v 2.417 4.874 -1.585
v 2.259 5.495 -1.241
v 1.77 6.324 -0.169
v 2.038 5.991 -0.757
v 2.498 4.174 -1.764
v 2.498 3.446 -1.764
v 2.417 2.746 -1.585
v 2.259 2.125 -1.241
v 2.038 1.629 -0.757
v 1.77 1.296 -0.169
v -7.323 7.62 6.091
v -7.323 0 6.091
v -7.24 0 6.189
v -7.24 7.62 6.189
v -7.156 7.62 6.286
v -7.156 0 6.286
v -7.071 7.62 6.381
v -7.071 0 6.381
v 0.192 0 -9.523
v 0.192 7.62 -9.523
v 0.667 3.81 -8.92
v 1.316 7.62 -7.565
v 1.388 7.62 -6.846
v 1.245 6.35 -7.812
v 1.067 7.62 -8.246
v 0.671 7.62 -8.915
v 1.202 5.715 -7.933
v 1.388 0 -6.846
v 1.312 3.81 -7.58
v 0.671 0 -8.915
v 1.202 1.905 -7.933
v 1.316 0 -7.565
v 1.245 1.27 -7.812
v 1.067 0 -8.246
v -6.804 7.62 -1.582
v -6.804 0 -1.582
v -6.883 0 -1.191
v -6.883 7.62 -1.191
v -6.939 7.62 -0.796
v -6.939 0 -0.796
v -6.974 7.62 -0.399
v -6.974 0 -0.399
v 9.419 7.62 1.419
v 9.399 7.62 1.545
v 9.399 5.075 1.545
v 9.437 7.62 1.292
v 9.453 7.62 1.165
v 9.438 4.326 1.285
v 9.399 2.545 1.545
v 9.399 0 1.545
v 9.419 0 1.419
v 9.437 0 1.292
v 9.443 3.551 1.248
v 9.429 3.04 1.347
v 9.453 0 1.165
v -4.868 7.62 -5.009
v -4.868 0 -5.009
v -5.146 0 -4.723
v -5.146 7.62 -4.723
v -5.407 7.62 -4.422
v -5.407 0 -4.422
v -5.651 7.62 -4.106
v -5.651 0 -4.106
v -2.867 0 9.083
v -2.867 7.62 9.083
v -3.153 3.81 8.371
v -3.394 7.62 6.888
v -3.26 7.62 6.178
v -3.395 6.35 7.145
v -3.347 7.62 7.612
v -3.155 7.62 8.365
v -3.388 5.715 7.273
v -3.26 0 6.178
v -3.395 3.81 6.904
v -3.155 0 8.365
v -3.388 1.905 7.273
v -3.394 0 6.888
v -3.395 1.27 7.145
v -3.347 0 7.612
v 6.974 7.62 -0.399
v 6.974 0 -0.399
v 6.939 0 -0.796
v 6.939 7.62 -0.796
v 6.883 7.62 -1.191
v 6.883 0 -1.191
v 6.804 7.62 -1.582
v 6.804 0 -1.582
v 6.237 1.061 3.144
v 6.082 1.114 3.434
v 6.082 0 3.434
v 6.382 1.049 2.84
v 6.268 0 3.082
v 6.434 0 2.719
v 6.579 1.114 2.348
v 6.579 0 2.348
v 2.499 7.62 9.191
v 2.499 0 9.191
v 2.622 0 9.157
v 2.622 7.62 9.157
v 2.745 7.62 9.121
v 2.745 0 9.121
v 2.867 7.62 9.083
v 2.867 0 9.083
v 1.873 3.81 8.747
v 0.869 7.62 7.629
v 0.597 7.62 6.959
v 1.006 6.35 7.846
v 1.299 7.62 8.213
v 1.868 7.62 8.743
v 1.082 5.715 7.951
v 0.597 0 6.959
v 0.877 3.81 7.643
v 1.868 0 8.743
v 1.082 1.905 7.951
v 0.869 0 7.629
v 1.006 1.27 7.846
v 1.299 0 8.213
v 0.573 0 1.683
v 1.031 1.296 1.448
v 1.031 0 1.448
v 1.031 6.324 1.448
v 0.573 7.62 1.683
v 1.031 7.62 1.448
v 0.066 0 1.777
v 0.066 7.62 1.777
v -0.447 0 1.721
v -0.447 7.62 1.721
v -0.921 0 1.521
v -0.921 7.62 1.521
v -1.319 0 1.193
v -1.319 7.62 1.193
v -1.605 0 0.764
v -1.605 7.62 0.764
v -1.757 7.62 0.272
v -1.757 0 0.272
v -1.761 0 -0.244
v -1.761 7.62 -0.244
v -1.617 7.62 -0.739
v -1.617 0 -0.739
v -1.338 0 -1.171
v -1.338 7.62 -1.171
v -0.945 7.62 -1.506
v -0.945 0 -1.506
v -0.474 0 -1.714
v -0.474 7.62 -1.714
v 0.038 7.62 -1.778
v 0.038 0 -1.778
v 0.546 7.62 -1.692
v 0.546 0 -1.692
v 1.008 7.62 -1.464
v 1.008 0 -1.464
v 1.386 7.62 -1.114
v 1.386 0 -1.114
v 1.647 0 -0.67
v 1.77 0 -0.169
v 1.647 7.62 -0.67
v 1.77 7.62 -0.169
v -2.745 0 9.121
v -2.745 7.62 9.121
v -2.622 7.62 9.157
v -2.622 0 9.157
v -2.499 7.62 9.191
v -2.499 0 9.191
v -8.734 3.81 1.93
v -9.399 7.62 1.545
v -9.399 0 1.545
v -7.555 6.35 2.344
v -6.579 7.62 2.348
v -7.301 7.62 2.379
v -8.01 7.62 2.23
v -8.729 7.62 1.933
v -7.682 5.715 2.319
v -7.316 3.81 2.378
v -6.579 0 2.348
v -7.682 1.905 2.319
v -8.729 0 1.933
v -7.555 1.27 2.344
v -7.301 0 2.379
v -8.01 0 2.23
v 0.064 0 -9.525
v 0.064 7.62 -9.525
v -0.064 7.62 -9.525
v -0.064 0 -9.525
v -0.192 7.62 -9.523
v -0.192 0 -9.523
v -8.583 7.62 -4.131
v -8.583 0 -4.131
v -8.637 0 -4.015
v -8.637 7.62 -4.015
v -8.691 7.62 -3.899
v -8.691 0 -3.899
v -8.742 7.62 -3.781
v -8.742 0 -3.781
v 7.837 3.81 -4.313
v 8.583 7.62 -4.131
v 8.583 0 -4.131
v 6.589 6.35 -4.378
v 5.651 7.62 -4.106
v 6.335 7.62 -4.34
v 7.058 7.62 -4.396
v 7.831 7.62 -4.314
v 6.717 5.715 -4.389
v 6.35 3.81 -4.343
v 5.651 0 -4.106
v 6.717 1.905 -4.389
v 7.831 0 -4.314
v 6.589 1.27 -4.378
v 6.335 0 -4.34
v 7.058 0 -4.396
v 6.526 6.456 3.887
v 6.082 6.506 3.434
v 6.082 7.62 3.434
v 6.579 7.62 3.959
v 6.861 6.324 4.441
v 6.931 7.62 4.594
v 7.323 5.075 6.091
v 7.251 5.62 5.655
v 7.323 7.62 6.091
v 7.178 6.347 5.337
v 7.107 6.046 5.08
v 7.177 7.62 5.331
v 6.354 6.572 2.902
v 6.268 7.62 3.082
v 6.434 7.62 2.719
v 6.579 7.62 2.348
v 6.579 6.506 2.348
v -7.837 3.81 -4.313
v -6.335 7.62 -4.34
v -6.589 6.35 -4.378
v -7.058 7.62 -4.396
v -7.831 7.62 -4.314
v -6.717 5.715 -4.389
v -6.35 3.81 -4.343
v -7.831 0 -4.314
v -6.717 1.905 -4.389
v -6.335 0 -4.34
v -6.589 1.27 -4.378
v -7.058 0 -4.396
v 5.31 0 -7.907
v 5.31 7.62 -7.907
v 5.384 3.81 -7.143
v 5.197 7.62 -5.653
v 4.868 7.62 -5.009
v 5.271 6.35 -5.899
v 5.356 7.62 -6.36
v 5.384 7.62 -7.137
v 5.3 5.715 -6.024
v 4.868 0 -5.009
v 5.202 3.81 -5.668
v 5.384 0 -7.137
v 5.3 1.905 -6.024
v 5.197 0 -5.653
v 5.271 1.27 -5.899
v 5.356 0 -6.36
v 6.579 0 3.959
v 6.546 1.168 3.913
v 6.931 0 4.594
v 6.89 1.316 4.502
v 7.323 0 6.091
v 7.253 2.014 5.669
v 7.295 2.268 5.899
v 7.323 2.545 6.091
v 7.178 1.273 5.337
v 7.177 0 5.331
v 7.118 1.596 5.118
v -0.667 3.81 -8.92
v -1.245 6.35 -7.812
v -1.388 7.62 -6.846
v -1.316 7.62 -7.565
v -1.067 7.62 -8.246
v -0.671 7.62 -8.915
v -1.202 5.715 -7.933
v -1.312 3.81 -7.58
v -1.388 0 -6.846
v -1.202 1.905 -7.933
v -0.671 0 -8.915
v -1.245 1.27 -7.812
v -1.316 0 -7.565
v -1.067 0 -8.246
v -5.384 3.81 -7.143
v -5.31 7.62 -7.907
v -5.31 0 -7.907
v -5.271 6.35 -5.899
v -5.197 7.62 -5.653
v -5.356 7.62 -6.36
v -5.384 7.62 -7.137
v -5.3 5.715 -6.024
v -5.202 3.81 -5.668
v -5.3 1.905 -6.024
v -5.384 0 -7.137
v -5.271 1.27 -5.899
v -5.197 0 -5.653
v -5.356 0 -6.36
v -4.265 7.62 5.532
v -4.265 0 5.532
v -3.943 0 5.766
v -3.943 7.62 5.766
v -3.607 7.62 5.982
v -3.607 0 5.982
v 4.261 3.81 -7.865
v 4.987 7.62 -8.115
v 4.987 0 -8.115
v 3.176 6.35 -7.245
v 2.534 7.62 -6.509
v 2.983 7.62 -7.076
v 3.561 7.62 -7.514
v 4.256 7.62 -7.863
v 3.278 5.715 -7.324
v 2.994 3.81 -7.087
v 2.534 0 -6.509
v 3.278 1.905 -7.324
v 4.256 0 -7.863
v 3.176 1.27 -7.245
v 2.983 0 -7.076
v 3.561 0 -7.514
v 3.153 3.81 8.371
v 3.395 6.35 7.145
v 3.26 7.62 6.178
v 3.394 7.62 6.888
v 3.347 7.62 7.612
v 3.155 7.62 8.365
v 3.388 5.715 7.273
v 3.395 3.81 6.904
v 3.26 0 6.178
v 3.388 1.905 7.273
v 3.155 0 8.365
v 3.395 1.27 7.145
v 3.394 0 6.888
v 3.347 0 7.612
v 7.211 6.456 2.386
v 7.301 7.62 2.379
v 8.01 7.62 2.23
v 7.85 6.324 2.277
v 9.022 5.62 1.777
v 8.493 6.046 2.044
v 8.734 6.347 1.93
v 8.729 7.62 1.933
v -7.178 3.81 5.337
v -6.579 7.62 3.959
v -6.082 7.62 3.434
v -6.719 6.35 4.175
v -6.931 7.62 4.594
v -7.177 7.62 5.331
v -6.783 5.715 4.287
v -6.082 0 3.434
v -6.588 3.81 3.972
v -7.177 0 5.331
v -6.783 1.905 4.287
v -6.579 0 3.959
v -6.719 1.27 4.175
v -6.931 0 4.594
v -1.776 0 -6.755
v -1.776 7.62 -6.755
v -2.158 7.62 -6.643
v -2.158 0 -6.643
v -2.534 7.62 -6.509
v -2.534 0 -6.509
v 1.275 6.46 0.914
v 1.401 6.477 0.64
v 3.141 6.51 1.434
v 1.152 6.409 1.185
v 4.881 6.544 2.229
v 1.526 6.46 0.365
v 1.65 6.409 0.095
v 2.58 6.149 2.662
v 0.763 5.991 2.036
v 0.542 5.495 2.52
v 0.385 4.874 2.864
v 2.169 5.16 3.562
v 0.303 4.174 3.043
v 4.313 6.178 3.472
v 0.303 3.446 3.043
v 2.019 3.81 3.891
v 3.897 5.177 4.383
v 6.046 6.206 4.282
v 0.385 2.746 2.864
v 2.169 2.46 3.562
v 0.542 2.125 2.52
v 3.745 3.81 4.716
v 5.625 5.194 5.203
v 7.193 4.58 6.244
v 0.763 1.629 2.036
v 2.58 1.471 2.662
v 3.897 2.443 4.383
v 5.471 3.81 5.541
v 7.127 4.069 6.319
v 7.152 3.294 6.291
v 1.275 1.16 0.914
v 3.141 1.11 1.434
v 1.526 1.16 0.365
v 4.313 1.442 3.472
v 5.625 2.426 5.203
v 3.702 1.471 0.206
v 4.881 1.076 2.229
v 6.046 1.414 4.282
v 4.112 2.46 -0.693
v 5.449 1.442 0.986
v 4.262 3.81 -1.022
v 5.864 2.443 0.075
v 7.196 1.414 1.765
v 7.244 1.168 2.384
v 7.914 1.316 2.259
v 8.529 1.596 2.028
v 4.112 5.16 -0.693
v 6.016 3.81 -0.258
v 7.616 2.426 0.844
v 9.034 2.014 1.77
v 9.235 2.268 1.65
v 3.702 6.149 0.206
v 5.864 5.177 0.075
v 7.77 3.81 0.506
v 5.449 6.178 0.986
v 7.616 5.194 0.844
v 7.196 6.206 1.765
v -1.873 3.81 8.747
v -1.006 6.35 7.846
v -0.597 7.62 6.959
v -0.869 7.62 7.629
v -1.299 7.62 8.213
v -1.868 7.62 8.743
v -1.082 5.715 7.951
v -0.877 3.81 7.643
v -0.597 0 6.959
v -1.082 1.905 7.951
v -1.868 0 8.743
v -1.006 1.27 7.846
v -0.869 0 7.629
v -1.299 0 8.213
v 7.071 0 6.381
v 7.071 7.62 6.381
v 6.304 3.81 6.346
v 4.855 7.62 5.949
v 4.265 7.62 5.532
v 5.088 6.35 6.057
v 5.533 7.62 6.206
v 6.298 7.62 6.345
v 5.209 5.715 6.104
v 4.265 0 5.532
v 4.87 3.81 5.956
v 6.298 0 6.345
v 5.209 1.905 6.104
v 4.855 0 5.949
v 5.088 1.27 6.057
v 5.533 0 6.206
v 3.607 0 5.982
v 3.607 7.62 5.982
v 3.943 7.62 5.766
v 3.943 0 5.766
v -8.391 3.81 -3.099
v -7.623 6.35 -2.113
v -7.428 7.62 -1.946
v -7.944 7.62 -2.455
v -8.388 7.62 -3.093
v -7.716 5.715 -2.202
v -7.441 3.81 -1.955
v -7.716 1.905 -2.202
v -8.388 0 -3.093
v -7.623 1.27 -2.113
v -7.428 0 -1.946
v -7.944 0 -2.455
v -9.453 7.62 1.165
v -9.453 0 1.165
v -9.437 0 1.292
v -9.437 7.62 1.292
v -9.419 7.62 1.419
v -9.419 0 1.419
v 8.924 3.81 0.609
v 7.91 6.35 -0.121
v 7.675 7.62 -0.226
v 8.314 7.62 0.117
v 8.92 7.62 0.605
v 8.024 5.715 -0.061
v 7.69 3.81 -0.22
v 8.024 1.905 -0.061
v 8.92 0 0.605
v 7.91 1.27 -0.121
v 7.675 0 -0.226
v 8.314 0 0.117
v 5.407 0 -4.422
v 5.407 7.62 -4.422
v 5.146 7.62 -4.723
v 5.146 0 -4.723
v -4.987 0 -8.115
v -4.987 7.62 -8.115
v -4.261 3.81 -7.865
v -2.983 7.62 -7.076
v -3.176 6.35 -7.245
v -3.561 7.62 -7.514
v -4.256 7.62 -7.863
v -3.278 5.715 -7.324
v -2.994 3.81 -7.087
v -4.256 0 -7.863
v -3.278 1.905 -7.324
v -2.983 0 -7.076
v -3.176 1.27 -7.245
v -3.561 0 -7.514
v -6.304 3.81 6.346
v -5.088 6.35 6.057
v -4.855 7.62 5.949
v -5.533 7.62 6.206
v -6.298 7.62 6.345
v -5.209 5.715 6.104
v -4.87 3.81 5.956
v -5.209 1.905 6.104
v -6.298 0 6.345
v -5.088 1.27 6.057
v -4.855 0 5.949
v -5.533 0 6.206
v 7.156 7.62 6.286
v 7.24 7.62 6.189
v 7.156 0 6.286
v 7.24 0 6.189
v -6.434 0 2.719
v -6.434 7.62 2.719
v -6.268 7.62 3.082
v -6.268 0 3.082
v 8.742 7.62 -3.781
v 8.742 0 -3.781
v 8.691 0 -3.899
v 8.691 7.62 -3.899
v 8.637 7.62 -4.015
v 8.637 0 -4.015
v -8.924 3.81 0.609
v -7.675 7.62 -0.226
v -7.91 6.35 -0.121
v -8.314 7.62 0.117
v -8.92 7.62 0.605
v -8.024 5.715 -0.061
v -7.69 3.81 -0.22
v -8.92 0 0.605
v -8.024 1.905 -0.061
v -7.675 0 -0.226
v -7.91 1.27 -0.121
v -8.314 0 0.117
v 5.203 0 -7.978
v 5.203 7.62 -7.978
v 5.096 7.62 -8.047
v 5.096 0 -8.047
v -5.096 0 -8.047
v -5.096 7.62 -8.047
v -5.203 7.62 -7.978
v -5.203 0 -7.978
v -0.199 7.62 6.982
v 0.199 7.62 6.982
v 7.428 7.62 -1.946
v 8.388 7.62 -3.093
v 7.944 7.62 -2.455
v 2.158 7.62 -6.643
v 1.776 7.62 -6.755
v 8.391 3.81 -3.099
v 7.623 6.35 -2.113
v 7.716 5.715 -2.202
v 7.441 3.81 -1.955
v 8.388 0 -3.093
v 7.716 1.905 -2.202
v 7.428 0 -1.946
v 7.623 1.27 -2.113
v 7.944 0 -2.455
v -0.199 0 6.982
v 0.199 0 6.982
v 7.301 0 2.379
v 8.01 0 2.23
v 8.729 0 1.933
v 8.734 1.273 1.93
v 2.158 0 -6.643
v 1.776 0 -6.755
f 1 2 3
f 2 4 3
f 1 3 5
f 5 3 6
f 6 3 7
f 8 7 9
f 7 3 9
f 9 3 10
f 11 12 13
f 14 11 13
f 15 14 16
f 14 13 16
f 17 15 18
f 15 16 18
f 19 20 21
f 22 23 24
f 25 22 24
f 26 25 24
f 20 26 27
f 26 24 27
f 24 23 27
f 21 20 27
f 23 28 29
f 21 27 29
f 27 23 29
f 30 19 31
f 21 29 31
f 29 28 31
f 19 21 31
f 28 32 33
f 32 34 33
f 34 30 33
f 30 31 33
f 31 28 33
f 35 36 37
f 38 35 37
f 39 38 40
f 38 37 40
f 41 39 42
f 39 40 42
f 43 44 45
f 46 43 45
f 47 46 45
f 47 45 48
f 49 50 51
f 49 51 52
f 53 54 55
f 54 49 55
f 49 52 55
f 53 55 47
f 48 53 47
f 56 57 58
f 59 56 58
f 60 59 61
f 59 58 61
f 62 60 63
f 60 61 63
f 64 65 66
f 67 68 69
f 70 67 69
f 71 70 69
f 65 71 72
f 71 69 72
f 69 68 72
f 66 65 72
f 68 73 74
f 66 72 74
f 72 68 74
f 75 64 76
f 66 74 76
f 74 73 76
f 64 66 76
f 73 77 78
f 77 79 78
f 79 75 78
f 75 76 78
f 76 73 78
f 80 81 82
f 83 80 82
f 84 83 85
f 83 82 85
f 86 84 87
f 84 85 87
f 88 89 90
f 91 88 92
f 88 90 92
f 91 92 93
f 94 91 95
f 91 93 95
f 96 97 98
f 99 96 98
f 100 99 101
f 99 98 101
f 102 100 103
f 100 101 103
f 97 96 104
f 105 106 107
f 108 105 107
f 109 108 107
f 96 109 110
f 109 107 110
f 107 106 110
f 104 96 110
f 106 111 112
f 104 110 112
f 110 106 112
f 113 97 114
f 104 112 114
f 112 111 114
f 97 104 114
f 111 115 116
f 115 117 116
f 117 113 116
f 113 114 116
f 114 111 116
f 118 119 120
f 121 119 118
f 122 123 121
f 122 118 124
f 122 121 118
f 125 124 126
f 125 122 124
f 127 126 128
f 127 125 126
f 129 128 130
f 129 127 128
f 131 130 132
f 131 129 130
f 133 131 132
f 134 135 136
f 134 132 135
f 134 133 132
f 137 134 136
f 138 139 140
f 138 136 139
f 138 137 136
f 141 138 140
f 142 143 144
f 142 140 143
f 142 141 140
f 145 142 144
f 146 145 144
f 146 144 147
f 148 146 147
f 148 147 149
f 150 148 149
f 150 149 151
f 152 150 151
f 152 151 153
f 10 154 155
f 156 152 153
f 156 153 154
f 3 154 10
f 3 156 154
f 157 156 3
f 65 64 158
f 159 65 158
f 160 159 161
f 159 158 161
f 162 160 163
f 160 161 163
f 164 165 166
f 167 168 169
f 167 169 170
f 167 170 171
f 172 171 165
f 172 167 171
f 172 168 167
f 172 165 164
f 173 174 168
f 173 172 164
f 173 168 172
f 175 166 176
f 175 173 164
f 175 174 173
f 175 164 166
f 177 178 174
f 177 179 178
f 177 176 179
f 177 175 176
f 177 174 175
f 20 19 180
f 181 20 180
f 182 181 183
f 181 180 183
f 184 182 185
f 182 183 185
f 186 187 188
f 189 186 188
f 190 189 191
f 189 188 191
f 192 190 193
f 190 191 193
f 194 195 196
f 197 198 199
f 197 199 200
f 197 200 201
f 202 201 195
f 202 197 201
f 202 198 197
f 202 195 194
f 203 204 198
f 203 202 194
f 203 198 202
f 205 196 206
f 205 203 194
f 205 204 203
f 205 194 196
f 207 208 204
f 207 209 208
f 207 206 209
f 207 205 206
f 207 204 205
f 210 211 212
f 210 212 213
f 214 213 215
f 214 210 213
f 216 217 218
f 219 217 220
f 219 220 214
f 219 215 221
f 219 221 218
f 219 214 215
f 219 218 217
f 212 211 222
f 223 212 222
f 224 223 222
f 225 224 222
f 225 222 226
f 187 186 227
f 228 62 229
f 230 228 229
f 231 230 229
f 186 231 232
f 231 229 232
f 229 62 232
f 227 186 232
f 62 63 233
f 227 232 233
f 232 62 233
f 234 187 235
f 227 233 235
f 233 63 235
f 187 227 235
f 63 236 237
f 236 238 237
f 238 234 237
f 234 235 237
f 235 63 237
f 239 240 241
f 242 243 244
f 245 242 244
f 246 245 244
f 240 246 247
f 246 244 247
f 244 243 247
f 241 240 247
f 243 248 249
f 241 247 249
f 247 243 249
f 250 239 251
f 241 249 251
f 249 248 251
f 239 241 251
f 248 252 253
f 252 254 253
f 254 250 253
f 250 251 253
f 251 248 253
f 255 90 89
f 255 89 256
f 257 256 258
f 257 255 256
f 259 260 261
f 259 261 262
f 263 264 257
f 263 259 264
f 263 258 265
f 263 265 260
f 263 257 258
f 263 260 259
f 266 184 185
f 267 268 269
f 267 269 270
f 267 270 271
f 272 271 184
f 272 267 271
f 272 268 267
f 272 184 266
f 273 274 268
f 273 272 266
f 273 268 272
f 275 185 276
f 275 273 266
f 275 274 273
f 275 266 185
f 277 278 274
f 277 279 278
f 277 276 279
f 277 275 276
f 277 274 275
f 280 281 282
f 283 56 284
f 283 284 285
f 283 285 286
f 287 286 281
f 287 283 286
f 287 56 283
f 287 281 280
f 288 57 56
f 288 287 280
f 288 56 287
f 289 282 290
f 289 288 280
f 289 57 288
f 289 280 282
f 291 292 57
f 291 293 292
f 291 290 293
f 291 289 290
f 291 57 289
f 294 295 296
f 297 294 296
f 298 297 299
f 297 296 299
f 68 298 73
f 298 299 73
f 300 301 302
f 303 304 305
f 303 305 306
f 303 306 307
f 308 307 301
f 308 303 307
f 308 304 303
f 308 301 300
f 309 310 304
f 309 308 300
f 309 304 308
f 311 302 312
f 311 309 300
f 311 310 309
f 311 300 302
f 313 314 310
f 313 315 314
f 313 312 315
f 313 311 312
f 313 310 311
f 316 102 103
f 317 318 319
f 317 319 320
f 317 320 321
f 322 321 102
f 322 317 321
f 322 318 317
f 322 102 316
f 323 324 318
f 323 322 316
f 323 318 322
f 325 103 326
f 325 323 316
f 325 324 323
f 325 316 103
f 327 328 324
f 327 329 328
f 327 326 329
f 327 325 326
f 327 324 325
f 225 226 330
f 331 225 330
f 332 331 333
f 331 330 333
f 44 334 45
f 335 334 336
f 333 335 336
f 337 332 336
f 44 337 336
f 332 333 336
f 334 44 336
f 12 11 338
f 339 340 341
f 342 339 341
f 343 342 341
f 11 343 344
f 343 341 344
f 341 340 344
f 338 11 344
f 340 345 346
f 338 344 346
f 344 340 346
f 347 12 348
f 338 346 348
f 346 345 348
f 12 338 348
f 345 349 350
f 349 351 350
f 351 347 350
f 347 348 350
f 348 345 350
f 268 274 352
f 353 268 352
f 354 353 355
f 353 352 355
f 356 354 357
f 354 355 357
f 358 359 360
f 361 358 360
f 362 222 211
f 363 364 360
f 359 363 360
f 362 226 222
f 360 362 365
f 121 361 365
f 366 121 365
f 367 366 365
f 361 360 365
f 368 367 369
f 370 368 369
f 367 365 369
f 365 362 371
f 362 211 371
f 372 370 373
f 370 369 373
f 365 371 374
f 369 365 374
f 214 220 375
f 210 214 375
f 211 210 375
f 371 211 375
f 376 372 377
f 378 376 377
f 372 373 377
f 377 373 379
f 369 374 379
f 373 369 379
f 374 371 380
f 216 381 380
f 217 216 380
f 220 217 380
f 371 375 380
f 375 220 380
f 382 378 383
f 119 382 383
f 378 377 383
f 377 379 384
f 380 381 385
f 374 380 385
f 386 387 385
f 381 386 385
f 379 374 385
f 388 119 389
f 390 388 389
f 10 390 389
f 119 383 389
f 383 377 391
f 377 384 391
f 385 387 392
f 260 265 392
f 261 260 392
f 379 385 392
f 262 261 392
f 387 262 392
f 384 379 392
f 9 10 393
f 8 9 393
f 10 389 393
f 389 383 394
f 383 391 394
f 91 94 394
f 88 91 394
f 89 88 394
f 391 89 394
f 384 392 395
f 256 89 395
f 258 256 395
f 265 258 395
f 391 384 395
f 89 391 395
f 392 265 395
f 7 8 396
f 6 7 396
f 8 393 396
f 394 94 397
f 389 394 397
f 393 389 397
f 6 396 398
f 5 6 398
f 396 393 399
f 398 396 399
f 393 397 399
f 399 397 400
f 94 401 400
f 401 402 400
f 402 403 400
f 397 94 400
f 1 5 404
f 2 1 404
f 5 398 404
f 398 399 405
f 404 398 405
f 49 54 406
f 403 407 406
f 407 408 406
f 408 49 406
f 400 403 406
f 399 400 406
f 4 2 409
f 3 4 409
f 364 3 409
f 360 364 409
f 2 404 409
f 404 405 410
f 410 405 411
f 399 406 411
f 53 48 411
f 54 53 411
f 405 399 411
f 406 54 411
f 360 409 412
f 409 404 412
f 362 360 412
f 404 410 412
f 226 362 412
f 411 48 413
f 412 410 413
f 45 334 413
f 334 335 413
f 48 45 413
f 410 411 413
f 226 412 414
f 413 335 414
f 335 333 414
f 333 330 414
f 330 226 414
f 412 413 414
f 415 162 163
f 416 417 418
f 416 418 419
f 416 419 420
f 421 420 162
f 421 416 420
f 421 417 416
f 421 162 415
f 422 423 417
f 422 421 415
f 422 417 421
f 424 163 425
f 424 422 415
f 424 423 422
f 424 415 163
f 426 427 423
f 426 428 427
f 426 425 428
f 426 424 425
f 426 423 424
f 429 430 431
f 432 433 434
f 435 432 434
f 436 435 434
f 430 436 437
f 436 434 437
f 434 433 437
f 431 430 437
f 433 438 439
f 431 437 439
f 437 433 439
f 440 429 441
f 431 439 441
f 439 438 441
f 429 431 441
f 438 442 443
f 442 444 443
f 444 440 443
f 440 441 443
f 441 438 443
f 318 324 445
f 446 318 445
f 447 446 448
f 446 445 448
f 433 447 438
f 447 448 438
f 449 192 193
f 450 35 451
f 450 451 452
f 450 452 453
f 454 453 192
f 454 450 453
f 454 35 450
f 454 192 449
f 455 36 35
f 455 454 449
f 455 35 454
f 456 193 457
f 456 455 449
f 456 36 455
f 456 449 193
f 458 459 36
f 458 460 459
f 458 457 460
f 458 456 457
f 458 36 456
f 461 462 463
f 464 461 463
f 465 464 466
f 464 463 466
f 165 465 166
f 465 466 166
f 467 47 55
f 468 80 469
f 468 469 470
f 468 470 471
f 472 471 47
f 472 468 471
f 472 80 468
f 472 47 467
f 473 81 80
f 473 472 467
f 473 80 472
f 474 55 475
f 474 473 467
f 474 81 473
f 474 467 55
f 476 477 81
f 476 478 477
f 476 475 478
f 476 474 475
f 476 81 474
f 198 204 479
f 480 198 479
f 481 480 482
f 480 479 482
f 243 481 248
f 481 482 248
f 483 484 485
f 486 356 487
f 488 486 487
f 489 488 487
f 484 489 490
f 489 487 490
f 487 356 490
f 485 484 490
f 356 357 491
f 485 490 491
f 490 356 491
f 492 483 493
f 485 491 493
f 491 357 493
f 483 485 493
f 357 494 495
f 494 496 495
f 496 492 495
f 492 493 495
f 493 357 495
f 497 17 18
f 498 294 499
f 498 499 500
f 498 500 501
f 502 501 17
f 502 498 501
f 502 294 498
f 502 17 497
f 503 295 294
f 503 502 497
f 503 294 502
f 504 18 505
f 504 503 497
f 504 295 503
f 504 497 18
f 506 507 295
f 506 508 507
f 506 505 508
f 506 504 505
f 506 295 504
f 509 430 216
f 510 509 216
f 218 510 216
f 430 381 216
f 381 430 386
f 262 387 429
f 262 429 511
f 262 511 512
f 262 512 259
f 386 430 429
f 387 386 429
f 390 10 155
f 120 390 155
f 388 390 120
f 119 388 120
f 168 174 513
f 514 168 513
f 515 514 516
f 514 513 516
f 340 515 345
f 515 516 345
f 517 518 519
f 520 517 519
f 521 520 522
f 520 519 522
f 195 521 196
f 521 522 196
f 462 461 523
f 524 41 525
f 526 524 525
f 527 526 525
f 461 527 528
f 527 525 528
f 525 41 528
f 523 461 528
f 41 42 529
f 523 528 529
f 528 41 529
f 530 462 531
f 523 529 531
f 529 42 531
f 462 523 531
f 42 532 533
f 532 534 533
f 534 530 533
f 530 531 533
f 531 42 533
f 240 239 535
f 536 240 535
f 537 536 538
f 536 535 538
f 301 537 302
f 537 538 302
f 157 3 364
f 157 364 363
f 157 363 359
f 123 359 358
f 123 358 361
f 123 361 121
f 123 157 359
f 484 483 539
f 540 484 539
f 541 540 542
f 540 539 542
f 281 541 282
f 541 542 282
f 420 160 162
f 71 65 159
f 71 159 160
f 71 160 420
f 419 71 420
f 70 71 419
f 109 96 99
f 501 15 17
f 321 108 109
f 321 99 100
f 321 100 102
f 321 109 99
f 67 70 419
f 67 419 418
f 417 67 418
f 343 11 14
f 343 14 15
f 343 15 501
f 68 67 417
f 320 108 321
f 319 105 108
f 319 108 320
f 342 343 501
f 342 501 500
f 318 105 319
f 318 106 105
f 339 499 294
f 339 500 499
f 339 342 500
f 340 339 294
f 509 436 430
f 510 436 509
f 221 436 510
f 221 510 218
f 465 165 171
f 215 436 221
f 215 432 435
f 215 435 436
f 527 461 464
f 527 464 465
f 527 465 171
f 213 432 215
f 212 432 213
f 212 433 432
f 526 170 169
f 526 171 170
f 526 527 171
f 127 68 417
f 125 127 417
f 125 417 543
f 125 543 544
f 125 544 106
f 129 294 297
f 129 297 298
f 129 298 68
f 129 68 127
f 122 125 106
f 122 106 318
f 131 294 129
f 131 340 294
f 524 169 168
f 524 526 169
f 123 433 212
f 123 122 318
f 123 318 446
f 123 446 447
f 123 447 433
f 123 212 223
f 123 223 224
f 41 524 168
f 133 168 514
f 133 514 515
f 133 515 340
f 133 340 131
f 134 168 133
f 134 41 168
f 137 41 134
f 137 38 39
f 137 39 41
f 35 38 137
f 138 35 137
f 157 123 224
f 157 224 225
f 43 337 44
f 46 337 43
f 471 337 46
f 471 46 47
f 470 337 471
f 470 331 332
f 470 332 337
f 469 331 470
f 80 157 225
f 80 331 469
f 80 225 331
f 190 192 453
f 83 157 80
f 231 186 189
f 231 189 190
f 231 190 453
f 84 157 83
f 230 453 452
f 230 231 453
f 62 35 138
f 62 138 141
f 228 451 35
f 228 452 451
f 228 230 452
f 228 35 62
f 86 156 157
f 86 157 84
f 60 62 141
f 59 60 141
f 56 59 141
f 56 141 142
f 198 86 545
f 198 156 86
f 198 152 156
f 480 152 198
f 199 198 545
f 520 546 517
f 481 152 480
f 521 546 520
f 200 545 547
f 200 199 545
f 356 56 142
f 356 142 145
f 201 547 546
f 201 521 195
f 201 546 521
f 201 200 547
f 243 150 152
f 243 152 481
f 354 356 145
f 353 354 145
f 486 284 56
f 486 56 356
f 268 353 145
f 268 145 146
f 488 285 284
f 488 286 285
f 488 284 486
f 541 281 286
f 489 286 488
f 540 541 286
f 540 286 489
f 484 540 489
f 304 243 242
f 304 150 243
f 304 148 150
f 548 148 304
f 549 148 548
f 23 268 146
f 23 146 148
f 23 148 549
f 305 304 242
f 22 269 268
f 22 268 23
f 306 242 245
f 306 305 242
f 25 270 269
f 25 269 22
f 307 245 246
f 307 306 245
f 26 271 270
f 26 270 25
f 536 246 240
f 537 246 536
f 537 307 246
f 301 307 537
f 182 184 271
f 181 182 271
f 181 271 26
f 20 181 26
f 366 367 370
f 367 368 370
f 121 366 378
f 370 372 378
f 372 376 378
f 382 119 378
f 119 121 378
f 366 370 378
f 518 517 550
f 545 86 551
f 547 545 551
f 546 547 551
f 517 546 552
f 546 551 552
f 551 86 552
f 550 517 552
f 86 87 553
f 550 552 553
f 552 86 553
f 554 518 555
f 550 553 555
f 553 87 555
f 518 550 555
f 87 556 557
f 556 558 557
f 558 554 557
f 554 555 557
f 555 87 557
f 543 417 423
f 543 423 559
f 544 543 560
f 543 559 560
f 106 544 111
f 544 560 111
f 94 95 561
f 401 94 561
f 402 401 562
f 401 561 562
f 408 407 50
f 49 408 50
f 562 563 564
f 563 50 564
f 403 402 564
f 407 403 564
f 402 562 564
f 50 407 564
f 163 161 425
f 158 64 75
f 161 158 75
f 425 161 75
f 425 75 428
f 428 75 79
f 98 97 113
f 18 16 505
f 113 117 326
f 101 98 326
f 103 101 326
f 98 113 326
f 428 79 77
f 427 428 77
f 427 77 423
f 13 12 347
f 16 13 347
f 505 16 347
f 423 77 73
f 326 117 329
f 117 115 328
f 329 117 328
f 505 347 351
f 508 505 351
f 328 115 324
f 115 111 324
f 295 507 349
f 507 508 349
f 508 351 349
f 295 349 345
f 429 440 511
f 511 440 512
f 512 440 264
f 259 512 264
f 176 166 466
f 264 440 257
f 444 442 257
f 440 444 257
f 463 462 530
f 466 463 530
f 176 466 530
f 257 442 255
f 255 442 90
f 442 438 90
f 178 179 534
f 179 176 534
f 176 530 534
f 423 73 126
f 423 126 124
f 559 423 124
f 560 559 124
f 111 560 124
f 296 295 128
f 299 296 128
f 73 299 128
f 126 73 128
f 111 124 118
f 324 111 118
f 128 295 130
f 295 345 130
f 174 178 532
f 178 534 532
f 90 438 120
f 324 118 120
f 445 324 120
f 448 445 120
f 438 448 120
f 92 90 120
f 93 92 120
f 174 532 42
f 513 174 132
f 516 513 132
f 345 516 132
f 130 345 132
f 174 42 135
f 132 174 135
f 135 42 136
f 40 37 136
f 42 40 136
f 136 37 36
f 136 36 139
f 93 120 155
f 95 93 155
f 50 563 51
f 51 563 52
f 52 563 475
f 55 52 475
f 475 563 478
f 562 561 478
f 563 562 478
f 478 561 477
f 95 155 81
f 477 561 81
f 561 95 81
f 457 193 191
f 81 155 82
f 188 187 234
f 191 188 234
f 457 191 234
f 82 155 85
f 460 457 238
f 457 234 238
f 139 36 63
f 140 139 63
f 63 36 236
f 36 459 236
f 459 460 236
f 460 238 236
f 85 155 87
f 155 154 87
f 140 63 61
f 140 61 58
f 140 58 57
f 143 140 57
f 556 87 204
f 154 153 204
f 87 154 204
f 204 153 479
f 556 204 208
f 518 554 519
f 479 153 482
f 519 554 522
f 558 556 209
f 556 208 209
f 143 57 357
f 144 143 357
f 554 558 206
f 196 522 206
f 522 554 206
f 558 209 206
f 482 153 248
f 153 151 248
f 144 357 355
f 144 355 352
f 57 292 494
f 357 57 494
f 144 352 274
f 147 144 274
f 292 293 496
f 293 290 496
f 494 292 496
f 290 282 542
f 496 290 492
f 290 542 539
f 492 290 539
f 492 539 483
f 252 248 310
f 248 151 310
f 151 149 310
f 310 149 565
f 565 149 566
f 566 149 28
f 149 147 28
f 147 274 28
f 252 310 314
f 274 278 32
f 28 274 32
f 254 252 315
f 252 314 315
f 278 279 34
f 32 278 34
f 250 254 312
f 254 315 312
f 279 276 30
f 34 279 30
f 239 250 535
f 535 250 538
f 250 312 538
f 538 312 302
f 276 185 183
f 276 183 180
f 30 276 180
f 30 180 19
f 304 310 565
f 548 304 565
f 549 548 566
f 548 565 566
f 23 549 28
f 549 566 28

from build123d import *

# Parameters (mm, degrees)
SKETCH1_R           = 6.985
BOSS_EXTRUDE1_DEPTH = 7.62
CIRPATTERN1_COUNT   = 11
CUT_EXTRUDE1_DEPTH  = 16.43236868


# Read off the part's stored shape, not the designer's step: Cut-Extrude2
with BuildPart() as part:
    # Sketch1 → Boss-Extrude1 (new body)
    with BuildSketch(Plane(origin=(0, 0, 0), x_dir=(1, 0, 0), z_dir=(0, 1, 0))):
        Circle(SKETCH1_R)
        with BuildLine():
            add(Edge.make_bspline(
                [(1.387604422, 6.84578549), (1.423643939, 7.597190899), (0.984603354, 8.544581789), (0.361474483, 9.332383529), (0.192044664, 9.523063785)],
                knots=[0, 0, 0, 0, 0.250134969, 0.335748037, 0.335748037, 0.335748037, 0.335748037], degree=3))
            ThreePointArc((0.192044664, 9.523063785), (0, 9.525), (-0.192044664, 9.523063785))
            add(Edge.make_bspline(
                [(-1.387604422, 6.84578549), (-1.423643939, 7.597190899), (-0.984603354, 8.544581789), (-0.361474483, 9.332383529), (-0.192044664, 9.523063785)],
                knots=[0, 0, 0, 0, 0.250134969, 0.335748037, 0.335748037, 0.335748037, 0.335748037], degree=3))
            ThreePointArc((-1.387604422, 6.84578549), (0, 6.985), (1.387604422, 6.84578549))
        make_face()
    boss_extrude1 = extrude(amount=BOSS_EXTRUDE1_DEPTH)

    # CirPattern1: Boss-Extrude1 ×11 about axis
    cirpattern1_axis = Axis((0, 7.62, 0), (0, -1, 0))
    for i in range(1, CIRPATTERN1_COUNT):
        add(boss_extrude1.rotate(cirpattern1_axis, i * 360 / CIRPATTERN1_COUNT))

    # Sketch2 → Cut-Extrude1 (cut, through all)
    with BuildSketch(Plane(origin=(0, 7.62, 0), x_dir=(1, 0, 0), z_dir=(0, 1, 0))):
        with BuildLine():
            Line((1.769949078, 0.169009645), (1.031341185, -1.448316043))
            ThreePointArc((1.031341185, -1.448316043), (-1.617325688, 0.738607893), (1.769949078, 0.169009645))
        make_face()
    extrude(amount=-CUT_EXTRUDE1_DEPTH, mode=Mode.SUBTRACT)

    # Cut-Extrude2 outline → Cut-Extrude2 (revolve, cut)
    with BuildSketch(Plane(origin=(0, 3.81, 0), x_dir=(0, 1, 0), z_dir=(0.41541501300188993, 0, -0.9096319953545169))):
        Polygon((0, 1.539793168), (2.667, 1.539793168), (2.800559609, 9.191418023), (0, 9.191418023), align=None)
    revolve(axis=Axis((0, 3.81, 0), (0.9096319953545169, 0, 0.41541501300188993)), mode=Mode.SUBTRACT)


solid = part.part
